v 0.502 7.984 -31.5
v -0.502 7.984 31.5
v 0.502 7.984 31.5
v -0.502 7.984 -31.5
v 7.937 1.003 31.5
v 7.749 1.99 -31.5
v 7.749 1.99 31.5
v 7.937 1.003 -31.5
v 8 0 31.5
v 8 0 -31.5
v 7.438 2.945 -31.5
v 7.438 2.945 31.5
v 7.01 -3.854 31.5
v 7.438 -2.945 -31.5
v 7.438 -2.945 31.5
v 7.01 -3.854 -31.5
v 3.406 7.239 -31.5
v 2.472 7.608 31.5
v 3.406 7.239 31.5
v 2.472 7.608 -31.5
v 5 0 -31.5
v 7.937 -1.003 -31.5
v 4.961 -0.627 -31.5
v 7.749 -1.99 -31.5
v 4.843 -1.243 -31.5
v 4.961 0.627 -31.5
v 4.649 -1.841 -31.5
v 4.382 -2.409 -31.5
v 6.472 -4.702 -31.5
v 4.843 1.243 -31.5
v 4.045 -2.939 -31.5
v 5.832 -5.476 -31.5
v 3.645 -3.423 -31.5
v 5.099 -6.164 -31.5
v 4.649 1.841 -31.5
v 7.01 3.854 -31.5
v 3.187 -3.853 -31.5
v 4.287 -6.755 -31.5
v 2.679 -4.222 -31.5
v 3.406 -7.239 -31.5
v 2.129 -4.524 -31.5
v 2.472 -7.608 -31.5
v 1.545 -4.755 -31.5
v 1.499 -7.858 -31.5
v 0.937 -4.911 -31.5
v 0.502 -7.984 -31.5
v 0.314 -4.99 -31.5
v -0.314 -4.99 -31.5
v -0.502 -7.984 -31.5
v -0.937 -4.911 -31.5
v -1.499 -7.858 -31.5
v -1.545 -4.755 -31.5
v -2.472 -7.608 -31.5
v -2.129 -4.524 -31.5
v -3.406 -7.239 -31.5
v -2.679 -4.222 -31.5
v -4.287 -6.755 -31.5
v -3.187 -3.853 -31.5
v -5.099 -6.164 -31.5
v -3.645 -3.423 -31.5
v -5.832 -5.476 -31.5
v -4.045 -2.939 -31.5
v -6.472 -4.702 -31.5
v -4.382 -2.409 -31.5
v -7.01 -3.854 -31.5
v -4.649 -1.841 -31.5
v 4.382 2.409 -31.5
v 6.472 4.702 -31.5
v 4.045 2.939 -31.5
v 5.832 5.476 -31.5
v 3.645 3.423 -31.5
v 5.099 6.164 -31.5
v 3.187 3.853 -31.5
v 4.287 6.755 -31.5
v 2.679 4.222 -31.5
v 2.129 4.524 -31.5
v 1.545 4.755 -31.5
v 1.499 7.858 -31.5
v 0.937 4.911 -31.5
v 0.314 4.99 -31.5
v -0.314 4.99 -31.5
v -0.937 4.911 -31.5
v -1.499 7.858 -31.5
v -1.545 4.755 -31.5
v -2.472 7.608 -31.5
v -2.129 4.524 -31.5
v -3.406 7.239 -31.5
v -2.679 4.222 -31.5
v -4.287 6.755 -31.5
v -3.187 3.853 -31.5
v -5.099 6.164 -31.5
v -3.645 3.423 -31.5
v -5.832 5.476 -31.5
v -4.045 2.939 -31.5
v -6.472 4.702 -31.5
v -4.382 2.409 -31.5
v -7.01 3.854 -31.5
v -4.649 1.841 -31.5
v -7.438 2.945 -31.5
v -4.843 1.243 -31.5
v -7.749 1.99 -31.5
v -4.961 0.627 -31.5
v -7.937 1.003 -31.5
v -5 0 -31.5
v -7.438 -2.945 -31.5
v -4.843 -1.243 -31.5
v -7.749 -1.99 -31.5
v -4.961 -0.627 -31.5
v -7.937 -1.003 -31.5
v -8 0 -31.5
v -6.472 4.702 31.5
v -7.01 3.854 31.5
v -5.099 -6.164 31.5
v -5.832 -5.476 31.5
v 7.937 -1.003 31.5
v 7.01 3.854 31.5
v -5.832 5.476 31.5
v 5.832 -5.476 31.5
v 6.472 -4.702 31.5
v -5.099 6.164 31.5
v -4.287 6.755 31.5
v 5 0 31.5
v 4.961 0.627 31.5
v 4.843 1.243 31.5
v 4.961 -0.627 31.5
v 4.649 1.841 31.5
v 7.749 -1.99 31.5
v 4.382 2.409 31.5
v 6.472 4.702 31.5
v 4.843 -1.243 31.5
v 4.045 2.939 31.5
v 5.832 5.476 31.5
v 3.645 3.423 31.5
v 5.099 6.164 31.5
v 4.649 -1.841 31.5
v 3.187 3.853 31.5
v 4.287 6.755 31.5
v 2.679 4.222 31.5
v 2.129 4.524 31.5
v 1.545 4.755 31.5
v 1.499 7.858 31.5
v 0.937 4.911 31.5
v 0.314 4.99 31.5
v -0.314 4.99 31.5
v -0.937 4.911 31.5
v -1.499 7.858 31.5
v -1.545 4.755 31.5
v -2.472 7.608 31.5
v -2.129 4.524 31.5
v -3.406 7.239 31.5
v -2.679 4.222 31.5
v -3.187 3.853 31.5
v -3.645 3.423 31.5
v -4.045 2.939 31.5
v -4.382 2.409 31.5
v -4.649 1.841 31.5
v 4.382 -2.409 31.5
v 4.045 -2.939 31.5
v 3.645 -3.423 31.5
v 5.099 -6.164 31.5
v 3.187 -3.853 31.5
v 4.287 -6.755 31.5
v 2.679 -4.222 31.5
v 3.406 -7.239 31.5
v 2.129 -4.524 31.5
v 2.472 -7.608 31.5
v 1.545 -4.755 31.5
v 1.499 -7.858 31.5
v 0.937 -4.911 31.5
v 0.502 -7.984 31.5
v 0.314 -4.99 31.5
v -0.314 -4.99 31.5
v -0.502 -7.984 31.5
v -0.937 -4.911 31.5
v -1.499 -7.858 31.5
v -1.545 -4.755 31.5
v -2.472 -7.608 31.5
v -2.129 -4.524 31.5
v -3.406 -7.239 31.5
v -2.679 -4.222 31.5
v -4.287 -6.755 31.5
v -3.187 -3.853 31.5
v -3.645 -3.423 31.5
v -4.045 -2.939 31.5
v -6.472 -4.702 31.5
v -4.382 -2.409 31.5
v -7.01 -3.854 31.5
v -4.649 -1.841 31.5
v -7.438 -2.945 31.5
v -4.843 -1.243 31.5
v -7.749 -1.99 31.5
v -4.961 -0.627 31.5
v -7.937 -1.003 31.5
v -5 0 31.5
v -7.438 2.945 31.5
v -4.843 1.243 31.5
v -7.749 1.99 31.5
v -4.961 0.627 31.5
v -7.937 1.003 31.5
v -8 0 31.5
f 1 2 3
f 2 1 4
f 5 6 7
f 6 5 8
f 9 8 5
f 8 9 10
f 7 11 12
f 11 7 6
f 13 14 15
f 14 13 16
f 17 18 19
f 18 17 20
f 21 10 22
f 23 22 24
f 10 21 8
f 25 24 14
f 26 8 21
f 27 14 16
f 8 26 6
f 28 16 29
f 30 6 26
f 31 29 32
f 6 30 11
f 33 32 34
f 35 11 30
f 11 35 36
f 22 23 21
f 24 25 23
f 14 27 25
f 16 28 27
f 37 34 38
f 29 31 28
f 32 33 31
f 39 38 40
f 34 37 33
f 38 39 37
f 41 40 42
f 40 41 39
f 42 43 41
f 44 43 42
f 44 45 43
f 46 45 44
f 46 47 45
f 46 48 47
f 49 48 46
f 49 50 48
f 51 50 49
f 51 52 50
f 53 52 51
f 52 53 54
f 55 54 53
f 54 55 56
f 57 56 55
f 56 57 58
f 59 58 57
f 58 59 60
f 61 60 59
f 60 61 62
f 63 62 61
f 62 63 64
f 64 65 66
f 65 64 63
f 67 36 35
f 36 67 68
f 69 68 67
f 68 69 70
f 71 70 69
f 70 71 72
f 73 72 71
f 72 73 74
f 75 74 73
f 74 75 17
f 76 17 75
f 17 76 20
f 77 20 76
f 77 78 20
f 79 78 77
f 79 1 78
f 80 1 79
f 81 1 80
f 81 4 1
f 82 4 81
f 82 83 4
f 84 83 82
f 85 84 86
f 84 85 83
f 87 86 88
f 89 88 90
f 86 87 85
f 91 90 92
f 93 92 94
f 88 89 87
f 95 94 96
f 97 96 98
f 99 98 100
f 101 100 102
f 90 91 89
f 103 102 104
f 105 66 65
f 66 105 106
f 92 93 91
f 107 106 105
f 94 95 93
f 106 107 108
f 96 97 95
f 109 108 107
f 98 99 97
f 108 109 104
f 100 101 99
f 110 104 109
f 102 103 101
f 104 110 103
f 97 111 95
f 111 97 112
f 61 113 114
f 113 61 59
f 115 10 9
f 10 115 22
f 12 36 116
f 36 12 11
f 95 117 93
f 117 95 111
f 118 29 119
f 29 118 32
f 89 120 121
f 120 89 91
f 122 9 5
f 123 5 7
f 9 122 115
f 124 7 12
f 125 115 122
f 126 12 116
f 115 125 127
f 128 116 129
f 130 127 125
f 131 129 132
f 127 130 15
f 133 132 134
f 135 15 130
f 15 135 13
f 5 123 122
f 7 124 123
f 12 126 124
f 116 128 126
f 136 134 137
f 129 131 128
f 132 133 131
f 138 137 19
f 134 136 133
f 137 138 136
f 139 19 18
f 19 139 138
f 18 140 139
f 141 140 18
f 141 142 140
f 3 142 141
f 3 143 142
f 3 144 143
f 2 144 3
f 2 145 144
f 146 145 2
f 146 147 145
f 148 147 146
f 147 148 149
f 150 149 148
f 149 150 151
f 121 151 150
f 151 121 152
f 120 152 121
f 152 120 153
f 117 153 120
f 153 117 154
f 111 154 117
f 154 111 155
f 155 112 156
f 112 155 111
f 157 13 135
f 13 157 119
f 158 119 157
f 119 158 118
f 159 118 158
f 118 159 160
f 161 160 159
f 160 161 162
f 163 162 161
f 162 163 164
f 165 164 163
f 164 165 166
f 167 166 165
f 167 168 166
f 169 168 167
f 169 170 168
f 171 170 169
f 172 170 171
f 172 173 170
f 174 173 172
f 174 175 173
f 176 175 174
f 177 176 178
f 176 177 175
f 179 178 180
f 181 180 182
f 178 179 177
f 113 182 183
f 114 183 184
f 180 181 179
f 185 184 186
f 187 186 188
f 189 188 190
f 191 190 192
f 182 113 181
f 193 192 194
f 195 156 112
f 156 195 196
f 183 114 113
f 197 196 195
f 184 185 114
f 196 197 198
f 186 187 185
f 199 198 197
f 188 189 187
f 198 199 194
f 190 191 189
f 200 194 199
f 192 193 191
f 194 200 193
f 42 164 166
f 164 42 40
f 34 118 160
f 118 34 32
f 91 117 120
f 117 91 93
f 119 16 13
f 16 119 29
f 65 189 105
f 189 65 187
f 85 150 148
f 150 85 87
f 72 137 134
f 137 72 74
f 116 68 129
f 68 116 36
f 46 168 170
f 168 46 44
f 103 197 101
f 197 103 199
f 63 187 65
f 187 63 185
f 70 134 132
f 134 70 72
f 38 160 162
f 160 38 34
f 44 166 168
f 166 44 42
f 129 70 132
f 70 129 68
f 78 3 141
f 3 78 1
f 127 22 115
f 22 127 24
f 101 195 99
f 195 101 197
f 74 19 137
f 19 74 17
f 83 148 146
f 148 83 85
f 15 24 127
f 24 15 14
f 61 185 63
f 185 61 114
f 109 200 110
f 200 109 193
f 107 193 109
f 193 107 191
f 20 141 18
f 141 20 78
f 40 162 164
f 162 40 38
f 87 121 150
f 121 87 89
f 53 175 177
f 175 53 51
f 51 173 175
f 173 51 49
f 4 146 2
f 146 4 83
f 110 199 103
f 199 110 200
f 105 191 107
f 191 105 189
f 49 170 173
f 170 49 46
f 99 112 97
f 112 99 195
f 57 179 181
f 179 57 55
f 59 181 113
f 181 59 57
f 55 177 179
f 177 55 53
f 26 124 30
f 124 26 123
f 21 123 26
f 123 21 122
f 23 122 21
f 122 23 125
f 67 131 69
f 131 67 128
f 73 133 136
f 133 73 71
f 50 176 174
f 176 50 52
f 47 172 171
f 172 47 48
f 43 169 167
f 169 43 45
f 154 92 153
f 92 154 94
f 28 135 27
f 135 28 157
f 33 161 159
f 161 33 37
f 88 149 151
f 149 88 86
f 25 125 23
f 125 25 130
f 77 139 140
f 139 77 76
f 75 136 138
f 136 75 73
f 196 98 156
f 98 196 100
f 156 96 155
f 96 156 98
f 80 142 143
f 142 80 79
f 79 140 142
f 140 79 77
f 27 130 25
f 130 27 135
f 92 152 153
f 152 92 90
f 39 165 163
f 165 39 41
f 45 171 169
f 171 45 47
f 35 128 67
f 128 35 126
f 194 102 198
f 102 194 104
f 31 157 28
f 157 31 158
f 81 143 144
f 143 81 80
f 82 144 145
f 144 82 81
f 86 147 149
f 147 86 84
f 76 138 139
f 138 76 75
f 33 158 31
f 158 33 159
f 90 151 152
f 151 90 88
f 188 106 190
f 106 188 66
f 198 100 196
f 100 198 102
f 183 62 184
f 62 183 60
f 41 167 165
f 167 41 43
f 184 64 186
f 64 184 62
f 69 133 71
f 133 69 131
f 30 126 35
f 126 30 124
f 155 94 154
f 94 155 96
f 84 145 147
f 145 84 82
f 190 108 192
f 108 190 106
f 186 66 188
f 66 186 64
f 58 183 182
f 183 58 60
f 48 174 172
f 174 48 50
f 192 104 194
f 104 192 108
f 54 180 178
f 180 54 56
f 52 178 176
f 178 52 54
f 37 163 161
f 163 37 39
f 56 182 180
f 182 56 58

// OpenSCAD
$fn = 50;


difference() {
	union() {
		translate(v = [0, 0, -31.5000000000]) {
			cylinder(h = 63, r = 8.0000000000);
		}
	}
	union() {
		translate(v = [0, 0, -100.0000000000]) {
			cylinder(h = 200, r = 5.0000000000);
		}
	}
}
